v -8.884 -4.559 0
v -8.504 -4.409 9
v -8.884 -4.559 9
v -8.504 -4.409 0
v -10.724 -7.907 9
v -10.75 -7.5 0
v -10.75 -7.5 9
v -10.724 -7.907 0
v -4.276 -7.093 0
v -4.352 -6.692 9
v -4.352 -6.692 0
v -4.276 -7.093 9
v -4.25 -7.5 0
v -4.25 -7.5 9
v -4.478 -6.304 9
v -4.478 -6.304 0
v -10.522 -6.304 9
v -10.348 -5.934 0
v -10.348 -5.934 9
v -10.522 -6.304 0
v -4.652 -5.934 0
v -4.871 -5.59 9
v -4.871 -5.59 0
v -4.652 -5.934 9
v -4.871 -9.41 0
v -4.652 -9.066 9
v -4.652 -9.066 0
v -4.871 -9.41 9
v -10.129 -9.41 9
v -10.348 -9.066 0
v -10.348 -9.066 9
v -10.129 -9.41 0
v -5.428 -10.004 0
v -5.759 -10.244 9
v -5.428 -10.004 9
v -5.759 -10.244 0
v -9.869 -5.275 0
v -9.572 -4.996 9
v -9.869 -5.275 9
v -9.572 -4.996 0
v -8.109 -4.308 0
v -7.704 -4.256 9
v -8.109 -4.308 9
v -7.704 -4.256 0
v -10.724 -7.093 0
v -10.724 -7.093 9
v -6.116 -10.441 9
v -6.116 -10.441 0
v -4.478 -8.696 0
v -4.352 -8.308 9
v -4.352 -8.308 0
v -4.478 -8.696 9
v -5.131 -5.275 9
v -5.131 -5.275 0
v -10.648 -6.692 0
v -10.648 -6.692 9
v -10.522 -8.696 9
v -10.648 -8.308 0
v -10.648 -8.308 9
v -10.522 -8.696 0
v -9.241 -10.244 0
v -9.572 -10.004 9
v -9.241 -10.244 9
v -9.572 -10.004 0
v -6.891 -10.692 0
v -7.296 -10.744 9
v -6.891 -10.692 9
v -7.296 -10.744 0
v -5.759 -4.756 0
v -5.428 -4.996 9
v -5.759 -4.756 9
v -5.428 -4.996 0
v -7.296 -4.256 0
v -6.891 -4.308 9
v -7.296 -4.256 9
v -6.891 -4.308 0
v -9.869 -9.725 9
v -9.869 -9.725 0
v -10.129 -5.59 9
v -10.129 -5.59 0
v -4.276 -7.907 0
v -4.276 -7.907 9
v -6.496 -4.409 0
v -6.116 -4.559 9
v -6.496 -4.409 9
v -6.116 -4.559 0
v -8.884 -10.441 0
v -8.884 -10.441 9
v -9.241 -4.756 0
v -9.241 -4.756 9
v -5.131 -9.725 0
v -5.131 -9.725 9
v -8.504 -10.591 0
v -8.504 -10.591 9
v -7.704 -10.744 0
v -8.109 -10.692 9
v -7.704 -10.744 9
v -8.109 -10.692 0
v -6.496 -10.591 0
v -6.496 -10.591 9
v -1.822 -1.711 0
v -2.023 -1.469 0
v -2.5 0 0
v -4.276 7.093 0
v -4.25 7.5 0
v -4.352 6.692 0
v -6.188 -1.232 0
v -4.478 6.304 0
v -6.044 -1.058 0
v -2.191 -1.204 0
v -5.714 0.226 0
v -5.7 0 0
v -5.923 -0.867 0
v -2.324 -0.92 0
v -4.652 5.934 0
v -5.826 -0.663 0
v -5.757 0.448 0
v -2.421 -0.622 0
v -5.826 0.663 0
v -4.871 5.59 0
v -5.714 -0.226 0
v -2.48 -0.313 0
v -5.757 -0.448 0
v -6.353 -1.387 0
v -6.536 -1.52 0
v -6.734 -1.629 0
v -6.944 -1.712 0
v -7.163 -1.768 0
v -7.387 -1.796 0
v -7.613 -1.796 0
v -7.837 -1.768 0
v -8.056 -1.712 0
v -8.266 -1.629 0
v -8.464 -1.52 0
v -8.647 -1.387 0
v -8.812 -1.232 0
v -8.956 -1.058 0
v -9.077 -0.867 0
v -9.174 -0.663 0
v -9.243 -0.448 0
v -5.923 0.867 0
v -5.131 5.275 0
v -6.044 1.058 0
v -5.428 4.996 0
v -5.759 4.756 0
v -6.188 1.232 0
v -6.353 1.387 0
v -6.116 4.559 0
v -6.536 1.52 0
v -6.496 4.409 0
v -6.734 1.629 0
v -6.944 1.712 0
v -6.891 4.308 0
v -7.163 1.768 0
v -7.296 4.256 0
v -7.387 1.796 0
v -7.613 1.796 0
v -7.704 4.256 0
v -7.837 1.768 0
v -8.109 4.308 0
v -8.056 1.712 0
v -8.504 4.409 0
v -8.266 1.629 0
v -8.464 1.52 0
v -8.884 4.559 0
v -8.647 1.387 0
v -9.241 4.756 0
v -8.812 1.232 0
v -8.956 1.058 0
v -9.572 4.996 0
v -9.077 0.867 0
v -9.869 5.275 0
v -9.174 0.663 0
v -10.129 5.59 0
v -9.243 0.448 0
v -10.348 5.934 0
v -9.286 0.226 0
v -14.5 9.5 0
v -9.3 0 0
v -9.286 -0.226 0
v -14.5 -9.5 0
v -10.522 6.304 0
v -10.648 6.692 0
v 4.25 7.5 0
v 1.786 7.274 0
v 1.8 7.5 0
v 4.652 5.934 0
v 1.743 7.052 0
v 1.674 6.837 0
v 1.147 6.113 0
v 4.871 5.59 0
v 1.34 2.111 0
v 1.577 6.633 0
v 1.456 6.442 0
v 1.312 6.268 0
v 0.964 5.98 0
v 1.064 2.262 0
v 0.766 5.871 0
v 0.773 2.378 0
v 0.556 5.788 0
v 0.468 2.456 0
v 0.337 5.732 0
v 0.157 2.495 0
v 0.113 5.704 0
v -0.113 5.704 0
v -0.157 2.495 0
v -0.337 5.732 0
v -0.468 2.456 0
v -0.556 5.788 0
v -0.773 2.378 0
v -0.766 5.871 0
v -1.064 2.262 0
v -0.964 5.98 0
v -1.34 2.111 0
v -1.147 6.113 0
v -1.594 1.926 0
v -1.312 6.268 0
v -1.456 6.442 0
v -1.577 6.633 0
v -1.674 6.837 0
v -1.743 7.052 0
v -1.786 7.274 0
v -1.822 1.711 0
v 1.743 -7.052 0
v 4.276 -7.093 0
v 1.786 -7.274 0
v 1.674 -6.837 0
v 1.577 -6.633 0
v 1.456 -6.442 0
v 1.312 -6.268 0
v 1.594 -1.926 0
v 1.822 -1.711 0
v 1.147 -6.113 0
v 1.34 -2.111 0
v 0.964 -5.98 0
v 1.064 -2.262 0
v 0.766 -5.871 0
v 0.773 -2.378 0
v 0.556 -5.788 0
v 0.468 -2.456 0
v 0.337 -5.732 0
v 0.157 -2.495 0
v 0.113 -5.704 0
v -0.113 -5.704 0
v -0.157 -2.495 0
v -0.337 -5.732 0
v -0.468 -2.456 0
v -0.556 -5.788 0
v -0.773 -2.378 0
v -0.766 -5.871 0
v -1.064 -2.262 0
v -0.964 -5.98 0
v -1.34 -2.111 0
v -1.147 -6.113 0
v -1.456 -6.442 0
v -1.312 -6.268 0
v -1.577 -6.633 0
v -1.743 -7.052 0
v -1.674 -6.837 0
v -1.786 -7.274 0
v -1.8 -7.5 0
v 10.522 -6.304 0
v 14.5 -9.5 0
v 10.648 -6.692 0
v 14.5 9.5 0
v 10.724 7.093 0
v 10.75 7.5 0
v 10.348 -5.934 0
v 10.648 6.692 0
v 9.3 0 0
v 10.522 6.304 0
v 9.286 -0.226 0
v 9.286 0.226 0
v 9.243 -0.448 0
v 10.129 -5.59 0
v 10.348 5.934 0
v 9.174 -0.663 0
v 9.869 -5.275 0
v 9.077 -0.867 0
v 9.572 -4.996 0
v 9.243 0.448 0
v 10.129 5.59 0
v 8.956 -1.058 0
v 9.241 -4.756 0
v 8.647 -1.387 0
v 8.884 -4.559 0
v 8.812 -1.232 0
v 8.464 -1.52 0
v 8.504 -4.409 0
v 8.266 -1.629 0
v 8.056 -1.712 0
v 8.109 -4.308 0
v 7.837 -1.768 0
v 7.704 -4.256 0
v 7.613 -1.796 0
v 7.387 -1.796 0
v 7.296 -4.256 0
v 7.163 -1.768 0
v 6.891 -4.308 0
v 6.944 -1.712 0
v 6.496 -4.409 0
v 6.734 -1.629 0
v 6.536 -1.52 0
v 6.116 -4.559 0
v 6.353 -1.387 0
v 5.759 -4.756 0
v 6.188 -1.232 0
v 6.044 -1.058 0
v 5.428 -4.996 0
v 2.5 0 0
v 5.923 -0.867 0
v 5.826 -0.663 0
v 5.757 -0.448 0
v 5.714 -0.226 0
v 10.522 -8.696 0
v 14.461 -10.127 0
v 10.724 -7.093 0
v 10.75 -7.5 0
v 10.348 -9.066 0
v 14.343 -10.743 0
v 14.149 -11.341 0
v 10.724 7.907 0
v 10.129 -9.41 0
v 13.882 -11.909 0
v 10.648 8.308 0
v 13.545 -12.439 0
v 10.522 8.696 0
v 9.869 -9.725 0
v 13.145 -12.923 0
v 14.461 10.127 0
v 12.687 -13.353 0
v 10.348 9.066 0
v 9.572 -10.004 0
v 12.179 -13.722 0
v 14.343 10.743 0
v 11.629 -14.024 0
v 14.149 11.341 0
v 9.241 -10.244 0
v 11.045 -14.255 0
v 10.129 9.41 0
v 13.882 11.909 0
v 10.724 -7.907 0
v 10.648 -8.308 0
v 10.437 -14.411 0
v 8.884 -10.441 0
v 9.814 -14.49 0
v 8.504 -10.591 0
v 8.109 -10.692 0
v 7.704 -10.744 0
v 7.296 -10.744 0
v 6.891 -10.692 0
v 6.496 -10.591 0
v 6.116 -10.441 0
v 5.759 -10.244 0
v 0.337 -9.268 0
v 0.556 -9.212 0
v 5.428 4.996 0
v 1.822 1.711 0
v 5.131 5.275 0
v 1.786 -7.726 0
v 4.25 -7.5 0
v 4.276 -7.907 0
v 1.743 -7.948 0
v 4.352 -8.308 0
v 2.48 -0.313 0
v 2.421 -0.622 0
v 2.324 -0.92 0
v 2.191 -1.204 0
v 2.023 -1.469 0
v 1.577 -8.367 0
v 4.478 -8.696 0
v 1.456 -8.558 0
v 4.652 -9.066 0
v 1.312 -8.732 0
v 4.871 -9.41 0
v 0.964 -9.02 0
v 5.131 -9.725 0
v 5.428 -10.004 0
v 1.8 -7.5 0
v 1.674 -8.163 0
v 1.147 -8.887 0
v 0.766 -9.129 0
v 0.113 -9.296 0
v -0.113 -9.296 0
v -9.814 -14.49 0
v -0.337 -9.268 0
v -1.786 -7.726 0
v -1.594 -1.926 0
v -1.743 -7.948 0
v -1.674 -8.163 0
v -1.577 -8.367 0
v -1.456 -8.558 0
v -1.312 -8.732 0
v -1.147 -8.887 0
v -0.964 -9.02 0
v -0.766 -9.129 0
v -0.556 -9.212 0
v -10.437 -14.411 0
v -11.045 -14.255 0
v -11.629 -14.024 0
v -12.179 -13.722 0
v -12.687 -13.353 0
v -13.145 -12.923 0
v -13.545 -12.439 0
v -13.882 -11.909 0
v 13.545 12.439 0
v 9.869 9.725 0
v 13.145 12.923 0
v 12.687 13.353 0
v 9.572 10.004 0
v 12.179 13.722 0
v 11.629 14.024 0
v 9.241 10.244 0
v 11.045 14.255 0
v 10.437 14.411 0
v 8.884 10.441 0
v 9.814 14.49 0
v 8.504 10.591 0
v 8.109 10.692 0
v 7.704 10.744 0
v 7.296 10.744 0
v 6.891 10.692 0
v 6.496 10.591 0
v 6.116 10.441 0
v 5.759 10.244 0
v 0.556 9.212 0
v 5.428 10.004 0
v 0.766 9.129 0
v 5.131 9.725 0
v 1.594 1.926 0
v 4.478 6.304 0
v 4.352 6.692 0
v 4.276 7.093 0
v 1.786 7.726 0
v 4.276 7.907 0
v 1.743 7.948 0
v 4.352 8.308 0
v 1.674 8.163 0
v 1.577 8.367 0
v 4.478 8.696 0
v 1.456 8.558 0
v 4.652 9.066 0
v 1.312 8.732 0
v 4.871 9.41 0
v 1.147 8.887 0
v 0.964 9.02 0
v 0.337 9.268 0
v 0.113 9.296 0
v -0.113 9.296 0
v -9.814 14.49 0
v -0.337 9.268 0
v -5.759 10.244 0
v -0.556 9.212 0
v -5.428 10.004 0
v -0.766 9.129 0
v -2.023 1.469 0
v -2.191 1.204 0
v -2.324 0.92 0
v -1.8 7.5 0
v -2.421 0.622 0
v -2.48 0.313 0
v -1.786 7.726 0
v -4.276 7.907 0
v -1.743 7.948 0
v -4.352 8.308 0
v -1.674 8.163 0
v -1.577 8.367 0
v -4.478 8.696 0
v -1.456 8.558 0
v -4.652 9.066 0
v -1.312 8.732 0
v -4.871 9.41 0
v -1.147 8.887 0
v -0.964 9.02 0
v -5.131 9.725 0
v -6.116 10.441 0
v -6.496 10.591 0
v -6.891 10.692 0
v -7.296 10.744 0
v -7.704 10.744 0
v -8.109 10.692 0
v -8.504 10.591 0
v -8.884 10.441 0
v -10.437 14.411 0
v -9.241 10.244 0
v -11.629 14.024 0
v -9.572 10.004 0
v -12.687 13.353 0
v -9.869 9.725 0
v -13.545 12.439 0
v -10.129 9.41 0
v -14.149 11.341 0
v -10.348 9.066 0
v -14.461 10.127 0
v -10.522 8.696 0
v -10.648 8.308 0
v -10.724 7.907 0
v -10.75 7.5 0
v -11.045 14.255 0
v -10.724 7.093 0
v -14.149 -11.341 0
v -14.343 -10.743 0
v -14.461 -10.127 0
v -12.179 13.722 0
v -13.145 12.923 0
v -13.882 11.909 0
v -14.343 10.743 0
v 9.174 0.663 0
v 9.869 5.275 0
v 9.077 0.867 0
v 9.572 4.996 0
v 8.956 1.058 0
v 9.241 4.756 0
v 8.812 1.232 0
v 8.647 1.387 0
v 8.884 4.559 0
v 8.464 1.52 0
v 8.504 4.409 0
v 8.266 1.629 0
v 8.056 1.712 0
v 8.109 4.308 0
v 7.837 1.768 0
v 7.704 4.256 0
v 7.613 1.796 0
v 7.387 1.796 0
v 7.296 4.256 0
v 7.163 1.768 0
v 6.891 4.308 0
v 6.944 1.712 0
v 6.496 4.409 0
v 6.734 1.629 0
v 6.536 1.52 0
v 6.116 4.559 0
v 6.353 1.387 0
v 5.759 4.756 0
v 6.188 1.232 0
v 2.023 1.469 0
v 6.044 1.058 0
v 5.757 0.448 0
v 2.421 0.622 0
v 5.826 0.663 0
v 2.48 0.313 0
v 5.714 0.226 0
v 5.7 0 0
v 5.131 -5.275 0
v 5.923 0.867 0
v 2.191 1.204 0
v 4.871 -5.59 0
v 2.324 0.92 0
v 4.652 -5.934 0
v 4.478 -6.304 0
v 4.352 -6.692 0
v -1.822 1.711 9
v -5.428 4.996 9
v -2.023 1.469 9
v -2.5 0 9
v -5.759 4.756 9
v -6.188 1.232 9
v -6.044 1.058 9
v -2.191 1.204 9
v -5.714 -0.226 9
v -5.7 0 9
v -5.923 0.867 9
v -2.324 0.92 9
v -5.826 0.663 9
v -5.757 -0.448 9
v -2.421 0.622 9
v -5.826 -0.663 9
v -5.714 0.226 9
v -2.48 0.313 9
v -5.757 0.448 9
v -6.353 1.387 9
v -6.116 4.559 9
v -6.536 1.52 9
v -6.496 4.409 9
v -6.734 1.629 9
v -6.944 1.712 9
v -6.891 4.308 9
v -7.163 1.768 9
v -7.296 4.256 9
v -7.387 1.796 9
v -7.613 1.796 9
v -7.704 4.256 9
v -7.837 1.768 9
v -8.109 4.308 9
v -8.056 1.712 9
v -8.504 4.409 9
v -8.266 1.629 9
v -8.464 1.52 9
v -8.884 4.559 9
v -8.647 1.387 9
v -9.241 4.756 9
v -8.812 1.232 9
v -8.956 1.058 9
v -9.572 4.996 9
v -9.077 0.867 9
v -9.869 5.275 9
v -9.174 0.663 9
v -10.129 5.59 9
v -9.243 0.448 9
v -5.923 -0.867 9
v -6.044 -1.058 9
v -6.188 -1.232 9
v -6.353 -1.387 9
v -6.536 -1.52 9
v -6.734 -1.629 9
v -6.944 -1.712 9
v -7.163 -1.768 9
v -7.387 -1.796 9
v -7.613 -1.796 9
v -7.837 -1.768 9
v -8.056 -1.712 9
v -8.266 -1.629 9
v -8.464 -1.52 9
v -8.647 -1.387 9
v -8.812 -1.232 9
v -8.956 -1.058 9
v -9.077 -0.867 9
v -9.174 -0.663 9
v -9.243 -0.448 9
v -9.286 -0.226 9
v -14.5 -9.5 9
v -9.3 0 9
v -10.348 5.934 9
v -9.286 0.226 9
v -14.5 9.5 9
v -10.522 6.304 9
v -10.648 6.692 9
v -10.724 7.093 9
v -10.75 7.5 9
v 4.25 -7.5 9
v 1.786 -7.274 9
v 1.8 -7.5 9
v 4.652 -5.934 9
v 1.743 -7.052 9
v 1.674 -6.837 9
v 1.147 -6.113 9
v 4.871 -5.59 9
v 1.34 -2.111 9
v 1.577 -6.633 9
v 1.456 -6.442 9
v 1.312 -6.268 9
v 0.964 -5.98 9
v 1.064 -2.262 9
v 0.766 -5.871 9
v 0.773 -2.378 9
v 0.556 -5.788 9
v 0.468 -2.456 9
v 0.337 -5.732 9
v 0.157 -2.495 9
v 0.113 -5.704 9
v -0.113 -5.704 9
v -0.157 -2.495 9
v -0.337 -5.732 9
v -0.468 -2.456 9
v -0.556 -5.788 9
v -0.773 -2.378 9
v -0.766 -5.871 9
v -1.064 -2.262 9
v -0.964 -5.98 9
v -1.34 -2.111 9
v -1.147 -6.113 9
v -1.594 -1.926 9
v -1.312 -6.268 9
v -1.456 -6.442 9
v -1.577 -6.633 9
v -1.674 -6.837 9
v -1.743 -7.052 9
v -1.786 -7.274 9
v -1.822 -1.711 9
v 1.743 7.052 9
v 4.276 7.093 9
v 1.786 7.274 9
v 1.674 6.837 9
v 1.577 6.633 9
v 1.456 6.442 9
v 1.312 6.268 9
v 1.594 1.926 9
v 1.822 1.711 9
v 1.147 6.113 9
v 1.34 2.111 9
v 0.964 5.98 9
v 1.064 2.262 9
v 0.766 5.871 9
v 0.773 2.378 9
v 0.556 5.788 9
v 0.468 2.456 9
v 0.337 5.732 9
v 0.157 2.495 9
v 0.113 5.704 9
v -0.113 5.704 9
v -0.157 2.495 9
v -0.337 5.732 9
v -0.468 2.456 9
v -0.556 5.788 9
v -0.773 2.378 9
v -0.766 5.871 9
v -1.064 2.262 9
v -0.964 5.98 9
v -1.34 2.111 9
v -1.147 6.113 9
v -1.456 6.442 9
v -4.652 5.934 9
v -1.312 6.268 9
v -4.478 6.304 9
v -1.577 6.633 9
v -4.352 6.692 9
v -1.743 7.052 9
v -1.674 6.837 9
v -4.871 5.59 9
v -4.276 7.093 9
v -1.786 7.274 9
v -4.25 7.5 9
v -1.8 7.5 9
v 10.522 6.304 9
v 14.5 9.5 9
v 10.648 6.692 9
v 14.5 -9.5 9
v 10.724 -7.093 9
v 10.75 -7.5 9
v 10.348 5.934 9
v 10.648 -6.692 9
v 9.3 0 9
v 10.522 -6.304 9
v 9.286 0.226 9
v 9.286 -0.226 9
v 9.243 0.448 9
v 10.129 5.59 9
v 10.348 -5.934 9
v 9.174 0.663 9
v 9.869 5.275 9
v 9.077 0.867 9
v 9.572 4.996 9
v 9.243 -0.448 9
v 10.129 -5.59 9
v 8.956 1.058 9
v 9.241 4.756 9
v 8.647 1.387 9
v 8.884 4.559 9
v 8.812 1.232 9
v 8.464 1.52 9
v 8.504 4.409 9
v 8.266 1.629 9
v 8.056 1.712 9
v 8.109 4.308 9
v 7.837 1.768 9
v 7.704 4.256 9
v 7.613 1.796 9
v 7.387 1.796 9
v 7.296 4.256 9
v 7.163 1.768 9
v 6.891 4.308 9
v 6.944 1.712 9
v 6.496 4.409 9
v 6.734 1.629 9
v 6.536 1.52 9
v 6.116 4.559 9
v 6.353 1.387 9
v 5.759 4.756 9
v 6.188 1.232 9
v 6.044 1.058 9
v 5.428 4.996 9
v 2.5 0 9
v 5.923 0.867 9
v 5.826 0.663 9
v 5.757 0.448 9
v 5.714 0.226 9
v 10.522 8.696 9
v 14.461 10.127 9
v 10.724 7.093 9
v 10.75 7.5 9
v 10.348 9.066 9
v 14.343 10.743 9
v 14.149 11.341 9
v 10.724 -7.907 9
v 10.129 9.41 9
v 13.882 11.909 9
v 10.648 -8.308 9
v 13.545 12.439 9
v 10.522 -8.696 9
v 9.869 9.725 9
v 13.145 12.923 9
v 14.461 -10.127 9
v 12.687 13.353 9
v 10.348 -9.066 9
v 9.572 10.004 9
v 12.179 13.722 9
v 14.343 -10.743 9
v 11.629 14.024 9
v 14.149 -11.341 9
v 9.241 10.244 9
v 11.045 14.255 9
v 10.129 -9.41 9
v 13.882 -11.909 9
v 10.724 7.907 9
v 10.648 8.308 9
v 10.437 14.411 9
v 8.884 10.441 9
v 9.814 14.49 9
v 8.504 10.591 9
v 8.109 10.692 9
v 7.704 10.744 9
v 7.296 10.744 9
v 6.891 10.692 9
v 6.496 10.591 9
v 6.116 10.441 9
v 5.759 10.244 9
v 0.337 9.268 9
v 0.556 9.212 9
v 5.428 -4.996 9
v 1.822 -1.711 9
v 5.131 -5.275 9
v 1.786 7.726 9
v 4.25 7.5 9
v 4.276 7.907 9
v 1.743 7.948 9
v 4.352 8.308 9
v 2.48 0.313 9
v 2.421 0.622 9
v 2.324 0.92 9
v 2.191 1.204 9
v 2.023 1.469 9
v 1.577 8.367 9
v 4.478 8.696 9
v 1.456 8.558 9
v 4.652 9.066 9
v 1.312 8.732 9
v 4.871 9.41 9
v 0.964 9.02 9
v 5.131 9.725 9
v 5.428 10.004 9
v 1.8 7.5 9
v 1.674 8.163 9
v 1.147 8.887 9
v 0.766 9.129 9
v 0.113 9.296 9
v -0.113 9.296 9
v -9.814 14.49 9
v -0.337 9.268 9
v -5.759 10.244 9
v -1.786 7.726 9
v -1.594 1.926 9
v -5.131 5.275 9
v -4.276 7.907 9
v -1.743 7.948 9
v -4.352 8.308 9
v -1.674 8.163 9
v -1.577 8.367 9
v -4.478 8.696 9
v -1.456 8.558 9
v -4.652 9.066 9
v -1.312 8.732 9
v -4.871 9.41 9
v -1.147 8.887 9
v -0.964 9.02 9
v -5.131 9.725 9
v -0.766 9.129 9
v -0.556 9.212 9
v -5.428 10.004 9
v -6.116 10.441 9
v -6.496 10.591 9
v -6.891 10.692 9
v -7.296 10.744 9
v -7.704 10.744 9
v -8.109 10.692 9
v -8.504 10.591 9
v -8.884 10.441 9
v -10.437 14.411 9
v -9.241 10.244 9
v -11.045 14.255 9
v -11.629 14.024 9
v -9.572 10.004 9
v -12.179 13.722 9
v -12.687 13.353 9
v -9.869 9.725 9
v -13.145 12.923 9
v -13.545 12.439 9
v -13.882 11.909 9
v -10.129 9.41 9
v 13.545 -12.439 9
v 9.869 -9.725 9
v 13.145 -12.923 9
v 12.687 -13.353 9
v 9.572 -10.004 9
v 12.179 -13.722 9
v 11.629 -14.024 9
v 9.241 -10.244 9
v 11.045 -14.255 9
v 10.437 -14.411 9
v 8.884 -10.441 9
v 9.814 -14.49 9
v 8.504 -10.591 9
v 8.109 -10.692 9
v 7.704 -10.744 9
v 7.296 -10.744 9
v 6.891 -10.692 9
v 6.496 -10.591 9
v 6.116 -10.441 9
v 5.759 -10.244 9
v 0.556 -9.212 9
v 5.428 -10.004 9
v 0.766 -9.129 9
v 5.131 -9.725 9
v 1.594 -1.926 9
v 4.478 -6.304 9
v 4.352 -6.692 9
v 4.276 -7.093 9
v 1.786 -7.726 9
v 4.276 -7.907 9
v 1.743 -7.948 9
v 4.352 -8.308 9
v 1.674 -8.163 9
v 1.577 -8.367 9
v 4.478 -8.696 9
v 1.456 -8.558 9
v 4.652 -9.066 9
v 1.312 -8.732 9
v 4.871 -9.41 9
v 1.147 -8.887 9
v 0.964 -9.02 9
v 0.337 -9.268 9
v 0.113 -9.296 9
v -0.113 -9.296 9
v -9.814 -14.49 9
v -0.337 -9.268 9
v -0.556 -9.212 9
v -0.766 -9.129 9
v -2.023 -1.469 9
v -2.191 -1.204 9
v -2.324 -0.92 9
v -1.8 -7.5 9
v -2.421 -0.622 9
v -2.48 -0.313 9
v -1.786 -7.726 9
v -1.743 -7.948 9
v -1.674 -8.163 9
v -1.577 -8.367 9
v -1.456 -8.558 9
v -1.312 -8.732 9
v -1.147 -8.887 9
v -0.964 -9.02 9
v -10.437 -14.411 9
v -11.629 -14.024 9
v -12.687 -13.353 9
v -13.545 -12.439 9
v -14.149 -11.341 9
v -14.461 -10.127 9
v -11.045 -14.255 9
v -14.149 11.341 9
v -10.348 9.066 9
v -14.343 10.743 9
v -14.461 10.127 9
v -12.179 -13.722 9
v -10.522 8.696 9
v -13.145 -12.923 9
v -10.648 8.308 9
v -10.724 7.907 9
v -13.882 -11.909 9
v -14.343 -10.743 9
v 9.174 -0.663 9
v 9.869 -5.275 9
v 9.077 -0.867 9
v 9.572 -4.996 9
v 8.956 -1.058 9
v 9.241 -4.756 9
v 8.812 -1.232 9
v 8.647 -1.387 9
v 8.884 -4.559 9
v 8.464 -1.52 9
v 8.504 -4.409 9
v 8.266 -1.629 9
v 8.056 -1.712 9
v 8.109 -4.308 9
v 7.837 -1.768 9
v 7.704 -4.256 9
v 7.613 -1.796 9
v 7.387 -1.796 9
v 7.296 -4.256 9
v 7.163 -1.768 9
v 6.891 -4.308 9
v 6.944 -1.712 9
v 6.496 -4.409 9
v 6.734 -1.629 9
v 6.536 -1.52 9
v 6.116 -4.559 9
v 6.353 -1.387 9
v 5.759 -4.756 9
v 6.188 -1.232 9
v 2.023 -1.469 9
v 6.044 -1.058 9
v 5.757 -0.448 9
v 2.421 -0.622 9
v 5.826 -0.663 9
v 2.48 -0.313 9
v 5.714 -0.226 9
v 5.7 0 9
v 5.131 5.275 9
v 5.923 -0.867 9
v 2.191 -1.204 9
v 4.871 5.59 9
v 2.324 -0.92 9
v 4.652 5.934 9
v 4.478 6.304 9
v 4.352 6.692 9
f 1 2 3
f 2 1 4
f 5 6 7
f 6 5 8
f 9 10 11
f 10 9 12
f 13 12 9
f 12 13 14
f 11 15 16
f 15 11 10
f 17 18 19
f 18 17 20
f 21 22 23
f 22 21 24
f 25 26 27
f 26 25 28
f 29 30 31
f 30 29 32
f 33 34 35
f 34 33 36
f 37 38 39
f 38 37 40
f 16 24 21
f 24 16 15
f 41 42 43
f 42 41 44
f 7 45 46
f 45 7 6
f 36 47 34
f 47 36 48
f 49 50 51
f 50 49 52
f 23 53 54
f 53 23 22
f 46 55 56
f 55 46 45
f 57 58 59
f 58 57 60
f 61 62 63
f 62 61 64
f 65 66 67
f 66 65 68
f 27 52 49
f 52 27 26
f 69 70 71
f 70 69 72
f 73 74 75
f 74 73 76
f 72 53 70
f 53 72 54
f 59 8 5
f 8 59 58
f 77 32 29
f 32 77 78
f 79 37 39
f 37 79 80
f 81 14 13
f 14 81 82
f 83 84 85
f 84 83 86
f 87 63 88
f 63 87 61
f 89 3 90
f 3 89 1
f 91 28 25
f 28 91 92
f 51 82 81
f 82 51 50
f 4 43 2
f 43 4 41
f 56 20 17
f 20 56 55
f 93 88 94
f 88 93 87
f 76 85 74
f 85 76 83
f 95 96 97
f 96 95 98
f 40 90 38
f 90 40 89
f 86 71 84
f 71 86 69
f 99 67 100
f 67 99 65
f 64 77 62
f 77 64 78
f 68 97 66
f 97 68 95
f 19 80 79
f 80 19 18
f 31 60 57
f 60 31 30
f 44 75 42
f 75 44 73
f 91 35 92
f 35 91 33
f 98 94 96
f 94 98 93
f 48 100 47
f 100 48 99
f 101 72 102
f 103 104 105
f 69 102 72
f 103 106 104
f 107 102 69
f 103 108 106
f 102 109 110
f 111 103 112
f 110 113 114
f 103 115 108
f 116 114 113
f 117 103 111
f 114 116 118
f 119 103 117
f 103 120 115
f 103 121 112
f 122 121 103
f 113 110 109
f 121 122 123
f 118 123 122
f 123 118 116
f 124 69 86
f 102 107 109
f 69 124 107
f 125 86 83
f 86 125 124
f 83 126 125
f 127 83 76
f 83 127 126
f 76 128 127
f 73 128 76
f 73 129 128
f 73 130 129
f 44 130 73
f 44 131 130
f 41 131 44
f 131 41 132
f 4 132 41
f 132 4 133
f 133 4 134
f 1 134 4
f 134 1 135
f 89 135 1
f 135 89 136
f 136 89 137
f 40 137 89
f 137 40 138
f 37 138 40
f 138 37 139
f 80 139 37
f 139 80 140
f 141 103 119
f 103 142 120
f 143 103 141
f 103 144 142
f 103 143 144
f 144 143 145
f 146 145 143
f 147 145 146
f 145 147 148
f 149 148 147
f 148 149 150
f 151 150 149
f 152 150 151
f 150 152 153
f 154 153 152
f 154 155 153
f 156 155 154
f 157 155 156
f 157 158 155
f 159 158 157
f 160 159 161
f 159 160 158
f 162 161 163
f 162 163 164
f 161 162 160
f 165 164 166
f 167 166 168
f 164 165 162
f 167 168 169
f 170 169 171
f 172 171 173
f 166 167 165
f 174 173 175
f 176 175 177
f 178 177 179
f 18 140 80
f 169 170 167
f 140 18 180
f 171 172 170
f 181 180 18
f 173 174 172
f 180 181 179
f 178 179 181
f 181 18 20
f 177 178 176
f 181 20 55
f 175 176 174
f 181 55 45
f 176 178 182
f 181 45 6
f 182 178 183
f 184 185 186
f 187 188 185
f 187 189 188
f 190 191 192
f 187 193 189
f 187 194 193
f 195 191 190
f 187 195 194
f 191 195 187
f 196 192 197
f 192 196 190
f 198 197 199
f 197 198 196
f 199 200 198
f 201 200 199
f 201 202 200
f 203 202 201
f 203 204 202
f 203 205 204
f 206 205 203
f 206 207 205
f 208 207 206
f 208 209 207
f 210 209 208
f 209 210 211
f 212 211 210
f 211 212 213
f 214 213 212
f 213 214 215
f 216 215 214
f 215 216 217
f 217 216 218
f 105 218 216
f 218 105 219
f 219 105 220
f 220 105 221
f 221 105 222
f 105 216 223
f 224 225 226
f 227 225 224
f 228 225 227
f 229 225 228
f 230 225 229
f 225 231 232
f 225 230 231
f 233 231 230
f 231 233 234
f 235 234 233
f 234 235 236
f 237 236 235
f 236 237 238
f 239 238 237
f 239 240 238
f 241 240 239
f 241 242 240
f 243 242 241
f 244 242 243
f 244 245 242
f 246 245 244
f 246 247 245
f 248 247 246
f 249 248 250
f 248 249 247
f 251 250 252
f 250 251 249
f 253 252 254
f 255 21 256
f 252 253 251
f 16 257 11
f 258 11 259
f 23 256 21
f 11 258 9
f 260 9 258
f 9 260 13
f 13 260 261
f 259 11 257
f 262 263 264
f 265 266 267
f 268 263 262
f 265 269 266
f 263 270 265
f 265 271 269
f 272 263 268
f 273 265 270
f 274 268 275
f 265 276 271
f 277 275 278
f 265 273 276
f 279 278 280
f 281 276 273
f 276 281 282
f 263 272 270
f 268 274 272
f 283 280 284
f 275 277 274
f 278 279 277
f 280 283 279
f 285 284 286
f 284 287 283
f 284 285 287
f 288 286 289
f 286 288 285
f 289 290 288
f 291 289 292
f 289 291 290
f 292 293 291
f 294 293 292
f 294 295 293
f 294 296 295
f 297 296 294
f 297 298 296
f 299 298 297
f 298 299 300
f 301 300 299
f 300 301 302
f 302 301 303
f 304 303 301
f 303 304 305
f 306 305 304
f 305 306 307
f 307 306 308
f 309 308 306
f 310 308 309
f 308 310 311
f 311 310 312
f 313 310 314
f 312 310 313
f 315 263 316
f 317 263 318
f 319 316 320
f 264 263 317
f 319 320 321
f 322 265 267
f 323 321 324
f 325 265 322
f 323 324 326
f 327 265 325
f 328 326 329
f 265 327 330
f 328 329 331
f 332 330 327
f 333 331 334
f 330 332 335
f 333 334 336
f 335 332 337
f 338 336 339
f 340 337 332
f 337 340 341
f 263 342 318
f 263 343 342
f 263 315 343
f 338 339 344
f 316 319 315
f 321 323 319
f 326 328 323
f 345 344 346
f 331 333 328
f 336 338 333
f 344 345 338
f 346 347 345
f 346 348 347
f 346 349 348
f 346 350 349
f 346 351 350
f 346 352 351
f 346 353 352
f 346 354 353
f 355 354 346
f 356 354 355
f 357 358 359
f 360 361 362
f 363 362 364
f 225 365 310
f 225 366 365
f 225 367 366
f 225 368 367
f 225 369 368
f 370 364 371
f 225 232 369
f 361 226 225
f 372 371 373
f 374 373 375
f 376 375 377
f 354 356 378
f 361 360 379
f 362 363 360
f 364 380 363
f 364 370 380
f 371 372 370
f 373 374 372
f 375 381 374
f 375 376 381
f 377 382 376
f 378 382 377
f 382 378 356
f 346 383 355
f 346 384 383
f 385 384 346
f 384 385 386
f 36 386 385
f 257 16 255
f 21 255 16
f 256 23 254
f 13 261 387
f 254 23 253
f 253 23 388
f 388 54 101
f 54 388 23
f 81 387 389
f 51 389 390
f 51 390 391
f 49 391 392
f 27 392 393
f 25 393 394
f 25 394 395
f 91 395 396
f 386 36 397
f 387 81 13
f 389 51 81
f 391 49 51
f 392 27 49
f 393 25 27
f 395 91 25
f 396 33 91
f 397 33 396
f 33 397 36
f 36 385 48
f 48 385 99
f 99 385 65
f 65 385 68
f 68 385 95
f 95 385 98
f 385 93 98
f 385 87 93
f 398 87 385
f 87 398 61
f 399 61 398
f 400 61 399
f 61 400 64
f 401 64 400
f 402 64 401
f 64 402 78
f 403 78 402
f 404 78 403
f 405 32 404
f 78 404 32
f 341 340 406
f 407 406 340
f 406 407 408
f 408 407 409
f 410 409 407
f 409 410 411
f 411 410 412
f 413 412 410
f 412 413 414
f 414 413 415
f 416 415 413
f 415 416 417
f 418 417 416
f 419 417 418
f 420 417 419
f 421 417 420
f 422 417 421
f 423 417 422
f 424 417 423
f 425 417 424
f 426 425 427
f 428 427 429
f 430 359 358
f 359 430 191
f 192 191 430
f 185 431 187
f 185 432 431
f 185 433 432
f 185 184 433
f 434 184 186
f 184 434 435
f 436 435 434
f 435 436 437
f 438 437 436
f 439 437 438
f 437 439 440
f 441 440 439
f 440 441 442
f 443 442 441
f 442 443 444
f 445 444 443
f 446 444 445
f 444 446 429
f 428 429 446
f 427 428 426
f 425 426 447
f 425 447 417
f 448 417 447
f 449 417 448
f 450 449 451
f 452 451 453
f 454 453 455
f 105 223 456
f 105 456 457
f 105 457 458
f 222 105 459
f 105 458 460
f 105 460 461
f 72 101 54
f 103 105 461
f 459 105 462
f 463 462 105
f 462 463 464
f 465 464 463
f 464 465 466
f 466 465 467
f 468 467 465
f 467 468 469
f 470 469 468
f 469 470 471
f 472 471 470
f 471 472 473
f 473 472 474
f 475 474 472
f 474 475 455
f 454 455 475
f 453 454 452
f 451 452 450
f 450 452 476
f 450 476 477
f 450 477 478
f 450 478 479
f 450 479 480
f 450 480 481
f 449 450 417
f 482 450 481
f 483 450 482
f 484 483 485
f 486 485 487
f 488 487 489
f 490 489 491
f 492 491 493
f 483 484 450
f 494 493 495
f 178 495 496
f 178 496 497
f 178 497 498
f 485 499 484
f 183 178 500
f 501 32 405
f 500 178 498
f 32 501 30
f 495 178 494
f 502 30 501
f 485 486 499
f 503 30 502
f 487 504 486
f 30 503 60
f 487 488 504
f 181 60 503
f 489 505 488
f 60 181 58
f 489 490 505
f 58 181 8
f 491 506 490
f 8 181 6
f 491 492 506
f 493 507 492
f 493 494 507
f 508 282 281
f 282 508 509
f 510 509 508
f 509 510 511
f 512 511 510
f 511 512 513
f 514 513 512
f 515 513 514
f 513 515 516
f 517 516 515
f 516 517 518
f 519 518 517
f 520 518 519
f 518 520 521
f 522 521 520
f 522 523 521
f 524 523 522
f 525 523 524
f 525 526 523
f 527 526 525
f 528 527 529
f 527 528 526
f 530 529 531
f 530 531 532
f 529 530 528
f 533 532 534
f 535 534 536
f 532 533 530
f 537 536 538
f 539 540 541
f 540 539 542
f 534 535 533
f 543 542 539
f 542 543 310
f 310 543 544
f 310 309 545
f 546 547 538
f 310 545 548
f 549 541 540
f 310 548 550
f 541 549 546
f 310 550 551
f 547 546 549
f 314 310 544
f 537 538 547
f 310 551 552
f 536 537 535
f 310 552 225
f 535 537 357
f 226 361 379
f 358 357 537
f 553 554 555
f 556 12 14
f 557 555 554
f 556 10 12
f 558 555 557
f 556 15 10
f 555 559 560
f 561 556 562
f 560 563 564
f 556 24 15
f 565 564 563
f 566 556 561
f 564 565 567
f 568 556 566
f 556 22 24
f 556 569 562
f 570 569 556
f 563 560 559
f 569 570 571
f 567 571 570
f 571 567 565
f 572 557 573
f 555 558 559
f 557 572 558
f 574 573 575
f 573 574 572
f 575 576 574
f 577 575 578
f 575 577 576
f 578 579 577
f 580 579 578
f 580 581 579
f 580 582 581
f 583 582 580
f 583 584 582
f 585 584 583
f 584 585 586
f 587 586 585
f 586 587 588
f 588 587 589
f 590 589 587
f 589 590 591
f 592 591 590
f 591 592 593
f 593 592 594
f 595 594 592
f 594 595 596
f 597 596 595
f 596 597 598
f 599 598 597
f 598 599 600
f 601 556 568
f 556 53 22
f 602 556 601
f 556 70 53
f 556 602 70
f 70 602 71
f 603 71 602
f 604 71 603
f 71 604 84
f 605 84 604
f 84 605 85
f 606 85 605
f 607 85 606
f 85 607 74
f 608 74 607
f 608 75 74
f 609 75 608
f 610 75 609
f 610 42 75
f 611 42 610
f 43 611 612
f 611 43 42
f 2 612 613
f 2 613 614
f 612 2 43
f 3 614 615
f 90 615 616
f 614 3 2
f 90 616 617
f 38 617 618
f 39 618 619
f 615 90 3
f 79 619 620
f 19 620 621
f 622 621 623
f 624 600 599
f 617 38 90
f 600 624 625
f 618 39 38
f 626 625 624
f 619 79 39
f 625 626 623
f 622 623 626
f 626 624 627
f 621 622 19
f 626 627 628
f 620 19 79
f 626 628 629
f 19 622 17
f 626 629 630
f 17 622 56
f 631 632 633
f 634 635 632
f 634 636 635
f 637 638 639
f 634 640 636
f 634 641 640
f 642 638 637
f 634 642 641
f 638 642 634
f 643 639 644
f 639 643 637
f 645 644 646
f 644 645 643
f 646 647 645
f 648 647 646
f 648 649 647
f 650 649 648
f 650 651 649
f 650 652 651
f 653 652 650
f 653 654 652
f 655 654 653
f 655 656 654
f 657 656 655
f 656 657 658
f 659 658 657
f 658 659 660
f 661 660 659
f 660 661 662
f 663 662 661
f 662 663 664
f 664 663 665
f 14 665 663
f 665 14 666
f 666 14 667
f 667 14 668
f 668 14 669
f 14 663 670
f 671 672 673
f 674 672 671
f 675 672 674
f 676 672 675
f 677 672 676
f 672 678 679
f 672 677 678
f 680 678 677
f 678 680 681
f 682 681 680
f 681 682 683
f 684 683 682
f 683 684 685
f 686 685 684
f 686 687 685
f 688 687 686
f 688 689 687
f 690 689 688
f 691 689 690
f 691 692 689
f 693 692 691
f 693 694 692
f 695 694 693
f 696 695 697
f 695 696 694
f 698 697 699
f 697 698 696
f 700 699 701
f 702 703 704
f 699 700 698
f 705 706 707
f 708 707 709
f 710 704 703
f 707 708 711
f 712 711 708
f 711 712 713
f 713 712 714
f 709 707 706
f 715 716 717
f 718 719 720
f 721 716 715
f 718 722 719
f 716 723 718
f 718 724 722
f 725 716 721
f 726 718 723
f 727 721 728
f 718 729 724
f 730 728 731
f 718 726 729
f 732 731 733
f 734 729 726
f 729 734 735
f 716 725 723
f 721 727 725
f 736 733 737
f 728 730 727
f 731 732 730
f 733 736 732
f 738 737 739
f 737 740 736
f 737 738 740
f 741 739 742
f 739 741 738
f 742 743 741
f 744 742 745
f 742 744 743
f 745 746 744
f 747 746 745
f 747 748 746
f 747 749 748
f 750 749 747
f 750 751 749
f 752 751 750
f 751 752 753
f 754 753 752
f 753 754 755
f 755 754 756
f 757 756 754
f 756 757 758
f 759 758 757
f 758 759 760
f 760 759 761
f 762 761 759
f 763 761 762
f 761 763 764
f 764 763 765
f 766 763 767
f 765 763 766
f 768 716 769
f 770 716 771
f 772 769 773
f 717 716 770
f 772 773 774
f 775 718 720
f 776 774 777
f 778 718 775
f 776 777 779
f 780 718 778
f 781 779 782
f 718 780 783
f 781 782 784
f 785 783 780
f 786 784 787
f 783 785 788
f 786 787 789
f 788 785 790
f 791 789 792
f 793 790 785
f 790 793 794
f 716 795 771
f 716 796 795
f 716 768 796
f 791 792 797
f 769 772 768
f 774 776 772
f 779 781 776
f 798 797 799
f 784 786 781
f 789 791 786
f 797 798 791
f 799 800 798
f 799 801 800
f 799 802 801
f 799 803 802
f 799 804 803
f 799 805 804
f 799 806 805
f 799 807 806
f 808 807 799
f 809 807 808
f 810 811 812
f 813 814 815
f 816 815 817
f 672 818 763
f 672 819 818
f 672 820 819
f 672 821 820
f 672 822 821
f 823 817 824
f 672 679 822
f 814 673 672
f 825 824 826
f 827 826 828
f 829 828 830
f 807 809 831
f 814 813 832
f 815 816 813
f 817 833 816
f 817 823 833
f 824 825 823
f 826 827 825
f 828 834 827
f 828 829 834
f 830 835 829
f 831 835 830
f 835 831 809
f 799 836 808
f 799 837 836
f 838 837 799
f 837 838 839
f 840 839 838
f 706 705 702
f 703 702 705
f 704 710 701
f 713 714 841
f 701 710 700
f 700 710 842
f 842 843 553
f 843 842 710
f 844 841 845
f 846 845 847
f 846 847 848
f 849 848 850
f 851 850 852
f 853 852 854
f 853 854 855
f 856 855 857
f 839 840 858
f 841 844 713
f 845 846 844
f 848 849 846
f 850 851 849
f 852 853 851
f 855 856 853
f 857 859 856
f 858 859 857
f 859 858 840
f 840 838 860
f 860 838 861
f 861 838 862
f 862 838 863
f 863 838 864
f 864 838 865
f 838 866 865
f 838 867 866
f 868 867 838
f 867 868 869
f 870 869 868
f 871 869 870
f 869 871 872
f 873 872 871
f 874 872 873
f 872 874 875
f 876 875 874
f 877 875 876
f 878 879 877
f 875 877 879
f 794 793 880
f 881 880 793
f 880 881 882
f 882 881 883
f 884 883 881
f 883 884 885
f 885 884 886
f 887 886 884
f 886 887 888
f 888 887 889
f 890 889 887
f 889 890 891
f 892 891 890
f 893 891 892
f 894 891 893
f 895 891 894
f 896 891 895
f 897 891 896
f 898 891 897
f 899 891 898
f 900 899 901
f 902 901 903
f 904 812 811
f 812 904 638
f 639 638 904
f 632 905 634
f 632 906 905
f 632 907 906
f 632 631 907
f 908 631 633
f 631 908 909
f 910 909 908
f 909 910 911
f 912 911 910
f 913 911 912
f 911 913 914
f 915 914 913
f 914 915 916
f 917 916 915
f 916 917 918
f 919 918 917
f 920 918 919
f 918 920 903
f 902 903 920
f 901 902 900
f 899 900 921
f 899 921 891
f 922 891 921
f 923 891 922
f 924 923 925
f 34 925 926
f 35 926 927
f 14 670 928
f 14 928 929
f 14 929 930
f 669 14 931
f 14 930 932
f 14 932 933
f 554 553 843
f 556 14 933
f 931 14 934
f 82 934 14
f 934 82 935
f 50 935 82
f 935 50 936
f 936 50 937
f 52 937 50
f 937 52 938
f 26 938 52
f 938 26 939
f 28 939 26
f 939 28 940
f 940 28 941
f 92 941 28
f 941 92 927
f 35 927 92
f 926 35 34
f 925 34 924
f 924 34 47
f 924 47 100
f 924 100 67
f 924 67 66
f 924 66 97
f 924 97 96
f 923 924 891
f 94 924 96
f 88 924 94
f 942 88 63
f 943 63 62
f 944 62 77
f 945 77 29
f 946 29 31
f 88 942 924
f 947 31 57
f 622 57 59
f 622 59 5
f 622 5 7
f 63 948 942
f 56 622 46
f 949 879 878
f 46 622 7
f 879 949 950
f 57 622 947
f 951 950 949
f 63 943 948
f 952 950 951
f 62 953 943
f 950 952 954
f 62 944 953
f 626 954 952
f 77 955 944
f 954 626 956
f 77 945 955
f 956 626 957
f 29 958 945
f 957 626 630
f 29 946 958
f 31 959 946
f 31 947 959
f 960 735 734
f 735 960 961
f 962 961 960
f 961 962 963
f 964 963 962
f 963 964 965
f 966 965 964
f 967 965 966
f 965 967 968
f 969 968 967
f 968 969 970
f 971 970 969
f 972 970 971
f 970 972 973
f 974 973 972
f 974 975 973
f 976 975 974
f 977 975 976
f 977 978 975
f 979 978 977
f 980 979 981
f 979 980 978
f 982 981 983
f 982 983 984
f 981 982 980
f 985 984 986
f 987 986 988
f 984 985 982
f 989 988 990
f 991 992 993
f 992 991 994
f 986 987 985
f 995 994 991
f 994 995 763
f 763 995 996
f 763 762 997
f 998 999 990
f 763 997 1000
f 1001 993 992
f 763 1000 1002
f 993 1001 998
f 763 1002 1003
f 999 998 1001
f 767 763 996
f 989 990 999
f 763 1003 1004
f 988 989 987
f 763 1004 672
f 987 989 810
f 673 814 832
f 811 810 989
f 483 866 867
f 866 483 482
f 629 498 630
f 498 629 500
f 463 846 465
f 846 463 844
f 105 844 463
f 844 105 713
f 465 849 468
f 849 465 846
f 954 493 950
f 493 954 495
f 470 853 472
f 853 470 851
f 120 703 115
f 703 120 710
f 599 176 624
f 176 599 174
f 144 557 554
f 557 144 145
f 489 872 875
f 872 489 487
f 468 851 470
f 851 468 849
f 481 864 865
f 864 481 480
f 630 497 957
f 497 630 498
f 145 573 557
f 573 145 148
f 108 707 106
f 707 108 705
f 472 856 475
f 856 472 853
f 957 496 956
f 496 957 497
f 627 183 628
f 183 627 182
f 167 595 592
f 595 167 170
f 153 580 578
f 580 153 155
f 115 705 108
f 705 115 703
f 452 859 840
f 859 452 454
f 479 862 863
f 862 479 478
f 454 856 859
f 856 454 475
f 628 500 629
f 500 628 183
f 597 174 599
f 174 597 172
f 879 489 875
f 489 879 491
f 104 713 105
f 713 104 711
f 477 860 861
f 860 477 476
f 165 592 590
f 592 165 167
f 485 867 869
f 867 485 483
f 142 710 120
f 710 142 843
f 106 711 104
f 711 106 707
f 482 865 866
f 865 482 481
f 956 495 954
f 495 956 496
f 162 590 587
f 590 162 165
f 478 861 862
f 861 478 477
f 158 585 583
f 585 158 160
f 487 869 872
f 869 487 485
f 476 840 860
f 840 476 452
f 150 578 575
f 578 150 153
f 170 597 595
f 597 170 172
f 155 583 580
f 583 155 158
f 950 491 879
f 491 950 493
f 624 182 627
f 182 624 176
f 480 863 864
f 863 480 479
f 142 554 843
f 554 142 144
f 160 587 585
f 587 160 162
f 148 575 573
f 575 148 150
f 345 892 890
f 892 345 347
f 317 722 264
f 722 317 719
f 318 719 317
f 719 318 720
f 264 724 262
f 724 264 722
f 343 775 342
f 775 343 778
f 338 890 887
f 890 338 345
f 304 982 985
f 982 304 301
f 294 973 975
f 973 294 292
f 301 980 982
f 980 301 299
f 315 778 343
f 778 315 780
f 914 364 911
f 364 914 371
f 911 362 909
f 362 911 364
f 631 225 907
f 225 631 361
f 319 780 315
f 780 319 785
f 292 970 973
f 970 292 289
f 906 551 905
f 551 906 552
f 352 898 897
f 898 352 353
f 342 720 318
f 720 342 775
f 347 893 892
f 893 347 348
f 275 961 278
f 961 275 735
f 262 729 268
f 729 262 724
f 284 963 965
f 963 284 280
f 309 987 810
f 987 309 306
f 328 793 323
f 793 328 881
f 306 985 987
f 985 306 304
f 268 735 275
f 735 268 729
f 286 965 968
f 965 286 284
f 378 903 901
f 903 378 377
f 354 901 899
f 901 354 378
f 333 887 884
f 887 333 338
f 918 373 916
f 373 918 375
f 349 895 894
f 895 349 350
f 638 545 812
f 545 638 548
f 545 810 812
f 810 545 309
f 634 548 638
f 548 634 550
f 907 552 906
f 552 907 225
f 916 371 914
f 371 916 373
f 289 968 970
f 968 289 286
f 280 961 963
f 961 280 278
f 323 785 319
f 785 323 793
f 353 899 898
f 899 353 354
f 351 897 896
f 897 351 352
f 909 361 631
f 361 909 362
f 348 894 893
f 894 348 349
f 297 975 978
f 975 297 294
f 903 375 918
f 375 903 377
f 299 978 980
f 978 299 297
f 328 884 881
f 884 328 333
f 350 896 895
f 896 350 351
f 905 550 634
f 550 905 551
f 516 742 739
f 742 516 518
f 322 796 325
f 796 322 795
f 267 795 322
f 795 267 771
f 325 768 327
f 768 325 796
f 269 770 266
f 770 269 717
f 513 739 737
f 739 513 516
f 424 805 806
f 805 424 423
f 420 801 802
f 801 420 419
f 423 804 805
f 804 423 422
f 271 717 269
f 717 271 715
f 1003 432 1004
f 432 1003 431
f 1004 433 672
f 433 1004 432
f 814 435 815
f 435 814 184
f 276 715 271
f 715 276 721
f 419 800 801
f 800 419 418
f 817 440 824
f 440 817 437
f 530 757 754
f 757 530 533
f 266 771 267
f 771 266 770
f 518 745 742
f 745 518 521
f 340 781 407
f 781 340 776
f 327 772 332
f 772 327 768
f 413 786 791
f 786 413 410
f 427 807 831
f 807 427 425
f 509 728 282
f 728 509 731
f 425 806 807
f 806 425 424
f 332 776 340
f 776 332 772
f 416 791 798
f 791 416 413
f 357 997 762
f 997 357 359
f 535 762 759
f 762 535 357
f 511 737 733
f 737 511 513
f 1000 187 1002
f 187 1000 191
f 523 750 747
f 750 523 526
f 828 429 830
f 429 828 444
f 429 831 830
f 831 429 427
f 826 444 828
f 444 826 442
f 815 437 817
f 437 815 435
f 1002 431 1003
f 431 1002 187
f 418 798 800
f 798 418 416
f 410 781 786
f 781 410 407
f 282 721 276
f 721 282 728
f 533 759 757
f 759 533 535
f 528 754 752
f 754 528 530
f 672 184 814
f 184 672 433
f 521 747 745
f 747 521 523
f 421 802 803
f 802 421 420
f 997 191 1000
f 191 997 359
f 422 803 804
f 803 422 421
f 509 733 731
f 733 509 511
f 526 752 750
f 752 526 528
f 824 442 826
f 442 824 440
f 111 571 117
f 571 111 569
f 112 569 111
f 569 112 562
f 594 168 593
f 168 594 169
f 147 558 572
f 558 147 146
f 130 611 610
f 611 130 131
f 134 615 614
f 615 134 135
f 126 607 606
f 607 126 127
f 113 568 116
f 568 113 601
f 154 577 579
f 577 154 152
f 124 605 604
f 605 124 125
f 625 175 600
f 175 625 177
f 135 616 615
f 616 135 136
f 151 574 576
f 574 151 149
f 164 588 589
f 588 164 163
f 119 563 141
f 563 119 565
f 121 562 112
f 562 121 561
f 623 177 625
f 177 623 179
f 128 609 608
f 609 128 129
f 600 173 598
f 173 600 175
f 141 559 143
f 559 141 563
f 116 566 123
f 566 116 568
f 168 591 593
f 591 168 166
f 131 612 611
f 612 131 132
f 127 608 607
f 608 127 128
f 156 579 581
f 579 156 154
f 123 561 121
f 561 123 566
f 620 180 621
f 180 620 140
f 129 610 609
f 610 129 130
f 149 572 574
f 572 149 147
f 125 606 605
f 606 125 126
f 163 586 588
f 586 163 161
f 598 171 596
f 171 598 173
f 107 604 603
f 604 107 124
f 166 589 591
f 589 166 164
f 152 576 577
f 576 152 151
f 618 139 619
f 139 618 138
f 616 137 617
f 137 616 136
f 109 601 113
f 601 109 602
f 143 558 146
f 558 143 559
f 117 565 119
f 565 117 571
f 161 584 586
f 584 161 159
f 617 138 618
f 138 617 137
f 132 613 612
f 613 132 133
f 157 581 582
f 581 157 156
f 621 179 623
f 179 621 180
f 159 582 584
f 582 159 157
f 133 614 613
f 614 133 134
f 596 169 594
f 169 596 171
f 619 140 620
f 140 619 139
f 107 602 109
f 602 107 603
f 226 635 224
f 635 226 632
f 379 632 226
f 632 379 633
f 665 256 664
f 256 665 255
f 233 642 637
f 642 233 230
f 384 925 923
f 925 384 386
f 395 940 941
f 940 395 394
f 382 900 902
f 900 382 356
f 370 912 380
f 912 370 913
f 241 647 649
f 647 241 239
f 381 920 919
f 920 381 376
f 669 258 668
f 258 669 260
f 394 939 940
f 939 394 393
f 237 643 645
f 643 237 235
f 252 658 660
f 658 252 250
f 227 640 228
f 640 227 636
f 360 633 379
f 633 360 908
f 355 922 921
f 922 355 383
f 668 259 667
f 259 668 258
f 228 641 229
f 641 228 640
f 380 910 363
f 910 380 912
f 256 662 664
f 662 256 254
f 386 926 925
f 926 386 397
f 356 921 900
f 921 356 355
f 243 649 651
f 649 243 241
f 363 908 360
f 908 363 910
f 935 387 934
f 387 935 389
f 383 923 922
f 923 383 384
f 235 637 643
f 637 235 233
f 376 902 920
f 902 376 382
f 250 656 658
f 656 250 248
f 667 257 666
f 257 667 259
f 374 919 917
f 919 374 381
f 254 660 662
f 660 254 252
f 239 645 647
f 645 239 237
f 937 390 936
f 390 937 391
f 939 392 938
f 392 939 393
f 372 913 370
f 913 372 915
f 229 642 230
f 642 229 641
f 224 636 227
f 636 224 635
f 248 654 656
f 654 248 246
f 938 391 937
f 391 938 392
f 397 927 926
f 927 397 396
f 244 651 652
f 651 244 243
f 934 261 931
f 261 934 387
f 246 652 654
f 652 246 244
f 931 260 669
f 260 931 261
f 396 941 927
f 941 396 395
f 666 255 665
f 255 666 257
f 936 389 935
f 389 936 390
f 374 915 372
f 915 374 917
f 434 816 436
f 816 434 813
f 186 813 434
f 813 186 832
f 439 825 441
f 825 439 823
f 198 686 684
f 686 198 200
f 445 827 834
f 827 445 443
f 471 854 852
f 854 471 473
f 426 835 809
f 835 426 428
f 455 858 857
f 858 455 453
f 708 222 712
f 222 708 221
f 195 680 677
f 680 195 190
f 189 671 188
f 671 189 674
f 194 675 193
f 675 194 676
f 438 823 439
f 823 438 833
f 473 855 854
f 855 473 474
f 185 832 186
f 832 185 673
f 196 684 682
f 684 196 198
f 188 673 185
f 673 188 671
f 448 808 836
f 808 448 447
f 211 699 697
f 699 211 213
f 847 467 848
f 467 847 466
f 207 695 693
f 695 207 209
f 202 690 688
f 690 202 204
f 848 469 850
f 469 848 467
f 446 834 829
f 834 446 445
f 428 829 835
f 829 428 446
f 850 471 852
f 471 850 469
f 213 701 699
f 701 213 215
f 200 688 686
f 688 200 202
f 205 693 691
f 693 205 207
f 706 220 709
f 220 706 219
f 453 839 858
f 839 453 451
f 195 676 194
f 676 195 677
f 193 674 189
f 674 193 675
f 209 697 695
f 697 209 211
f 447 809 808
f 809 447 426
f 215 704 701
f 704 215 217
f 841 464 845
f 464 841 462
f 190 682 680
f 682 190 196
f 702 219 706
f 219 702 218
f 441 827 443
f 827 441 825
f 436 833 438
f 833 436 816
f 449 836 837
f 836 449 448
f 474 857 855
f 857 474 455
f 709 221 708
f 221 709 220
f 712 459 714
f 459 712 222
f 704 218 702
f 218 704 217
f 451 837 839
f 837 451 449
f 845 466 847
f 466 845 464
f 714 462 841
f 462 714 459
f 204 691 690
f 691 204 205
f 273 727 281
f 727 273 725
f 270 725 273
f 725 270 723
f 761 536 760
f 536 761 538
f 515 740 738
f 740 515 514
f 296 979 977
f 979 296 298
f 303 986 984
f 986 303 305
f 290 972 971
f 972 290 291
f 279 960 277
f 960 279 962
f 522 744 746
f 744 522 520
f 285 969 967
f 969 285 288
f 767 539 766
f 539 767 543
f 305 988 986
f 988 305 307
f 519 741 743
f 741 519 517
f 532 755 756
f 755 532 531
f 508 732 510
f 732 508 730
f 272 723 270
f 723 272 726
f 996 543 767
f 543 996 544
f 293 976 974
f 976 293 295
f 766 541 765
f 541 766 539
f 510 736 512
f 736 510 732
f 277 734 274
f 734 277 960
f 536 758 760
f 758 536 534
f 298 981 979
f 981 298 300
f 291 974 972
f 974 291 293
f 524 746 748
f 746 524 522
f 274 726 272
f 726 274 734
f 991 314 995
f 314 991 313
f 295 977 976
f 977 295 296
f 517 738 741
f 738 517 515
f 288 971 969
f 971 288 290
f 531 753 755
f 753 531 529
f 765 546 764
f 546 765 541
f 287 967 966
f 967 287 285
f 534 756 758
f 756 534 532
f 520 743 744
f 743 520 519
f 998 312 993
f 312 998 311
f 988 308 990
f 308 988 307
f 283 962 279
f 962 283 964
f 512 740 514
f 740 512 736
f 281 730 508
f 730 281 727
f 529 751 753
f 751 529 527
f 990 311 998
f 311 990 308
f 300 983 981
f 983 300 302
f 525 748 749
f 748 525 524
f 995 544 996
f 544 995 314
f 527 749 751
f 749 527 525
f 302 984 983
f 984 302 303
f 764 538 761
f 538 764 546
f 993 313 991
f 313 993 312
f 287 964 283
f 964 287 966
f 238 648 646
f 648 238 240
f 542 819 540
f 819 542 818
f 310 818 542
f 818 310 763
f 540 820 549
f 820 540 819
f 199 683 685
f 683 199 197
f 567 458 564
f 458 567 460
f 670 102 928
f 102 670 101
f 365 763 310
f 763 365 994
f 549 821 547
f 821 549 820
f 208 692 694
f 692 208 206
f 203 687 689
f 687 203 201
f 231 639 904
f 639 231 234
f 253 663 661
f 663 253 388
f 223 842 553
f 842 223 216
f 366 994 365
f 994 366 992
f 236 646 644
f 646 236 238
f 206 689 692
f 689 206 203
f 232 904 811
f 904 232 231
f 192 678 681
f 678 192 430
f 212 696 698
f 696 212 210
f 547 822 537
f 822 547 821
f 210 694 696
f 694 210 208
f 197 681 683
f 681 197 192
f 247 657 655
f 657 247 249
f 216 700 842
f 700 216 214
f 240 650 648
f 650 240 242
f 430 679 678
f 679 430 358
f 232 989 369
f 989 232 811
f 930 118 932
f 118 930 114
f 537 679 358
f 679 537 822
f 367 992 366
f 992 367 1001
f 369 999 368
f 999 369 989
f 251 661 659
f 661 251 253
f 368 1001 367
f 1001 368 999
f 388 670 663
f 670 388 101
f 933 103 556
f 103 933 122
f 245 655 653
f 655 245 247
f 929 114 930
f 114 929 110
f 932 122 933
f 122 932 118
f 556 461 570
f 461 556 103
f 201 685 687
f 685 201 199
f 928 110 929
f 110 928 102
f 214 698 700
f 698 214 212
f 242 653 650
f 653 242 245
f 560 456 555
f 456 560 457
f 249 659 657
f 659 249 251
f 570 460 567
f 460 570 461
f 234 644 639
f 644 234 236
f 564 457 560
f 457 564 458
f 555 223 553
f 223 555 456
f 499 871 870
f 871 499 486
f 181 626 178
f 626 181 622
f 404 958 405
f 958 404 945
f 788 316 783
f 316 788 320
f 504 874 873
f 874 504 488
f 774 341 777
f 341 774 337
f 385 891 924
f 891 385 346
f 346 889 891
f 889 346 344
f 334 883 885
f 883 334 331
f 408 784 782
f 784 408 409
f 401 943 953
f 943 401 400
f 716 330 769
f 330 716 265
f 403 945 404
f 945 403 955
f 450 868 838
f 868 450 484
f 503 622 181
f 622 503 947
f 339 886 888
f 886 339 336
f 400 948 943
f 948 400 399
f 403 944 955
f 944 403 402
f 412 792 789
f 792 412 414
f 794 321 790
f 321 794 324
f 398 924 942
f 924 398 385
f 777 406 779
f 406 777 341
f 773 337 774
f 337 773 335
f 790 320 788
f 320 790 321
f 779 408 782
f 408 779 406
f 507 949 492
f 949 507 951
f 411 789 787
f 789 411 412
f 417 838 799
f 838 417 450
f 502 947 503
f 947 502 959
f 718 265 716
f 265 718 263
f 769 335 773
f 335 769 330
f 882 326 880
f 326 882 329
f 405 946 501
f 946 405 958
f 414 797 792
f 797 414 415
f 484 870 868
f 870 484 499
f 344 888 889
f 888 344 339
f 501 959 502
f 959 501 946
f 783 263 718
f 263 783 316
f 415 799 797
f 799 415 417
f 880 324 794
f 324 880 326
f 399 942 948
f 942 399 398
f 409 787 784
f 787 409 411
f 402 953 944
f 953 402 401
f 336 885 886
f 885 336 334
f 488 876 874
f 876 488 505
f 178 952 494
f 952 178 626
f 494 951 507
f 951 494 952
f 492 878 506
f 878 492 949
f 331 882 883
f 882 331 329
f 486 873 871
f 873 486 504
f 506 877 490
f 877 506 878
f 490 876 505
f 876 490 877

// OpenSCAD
$fn = 50;

difference() {
	union() {
		hull() {
			translate(v = [-9.5, 9.5, 0]) {
				cylinder(h = 9, r = 5);
			}
			translate(v = [9.5, 9.5, 0]) {
				cylinder(h = 9, r = 5);
			}
			translate(v = [-9.5, -9.5, 0]) {
				cylinder(h = 9, r = 5);
			}
			translate(v = [9.5, -9.5, 0]) {
				cylinder(h = 9, r = 5);
			}
		}
	}
	union() {
		translate(v = [-7.5, -7.5, 0]) {
			cylinder(h = 9, r = 3.25);
		}
		translate(v = [-7.5, 7.5, 0]) {
			cylinder(h = 9, r = 3.25);
		}
		translate(v = [7.5, -7.5, 0]) {
			cylinder(h = 9, r = 3.25);
		}
		translate(v = [7.5, 7.5, 0]) {
			cylinder(h = 9, r = 3.25);
		}
		translate(v = [-7.5, 0.0, 0]) {
			cylinder(h = 9, r = 1.8);
		}
		translate(v = [0.0, -7.5, 0]) {
			cylinder(h = 9, r = 1.8);
		}
		translate(v = [0.0, 7.5, 0]) {
			cylinder(h = 9, r = 1.8);
		}
		translate(v = [7.5, 0.0, 0]) {
			cylinder(h = 9, r = 1.8);
		}
		cylinder(h = 9, r = 2.5);
	}
}
